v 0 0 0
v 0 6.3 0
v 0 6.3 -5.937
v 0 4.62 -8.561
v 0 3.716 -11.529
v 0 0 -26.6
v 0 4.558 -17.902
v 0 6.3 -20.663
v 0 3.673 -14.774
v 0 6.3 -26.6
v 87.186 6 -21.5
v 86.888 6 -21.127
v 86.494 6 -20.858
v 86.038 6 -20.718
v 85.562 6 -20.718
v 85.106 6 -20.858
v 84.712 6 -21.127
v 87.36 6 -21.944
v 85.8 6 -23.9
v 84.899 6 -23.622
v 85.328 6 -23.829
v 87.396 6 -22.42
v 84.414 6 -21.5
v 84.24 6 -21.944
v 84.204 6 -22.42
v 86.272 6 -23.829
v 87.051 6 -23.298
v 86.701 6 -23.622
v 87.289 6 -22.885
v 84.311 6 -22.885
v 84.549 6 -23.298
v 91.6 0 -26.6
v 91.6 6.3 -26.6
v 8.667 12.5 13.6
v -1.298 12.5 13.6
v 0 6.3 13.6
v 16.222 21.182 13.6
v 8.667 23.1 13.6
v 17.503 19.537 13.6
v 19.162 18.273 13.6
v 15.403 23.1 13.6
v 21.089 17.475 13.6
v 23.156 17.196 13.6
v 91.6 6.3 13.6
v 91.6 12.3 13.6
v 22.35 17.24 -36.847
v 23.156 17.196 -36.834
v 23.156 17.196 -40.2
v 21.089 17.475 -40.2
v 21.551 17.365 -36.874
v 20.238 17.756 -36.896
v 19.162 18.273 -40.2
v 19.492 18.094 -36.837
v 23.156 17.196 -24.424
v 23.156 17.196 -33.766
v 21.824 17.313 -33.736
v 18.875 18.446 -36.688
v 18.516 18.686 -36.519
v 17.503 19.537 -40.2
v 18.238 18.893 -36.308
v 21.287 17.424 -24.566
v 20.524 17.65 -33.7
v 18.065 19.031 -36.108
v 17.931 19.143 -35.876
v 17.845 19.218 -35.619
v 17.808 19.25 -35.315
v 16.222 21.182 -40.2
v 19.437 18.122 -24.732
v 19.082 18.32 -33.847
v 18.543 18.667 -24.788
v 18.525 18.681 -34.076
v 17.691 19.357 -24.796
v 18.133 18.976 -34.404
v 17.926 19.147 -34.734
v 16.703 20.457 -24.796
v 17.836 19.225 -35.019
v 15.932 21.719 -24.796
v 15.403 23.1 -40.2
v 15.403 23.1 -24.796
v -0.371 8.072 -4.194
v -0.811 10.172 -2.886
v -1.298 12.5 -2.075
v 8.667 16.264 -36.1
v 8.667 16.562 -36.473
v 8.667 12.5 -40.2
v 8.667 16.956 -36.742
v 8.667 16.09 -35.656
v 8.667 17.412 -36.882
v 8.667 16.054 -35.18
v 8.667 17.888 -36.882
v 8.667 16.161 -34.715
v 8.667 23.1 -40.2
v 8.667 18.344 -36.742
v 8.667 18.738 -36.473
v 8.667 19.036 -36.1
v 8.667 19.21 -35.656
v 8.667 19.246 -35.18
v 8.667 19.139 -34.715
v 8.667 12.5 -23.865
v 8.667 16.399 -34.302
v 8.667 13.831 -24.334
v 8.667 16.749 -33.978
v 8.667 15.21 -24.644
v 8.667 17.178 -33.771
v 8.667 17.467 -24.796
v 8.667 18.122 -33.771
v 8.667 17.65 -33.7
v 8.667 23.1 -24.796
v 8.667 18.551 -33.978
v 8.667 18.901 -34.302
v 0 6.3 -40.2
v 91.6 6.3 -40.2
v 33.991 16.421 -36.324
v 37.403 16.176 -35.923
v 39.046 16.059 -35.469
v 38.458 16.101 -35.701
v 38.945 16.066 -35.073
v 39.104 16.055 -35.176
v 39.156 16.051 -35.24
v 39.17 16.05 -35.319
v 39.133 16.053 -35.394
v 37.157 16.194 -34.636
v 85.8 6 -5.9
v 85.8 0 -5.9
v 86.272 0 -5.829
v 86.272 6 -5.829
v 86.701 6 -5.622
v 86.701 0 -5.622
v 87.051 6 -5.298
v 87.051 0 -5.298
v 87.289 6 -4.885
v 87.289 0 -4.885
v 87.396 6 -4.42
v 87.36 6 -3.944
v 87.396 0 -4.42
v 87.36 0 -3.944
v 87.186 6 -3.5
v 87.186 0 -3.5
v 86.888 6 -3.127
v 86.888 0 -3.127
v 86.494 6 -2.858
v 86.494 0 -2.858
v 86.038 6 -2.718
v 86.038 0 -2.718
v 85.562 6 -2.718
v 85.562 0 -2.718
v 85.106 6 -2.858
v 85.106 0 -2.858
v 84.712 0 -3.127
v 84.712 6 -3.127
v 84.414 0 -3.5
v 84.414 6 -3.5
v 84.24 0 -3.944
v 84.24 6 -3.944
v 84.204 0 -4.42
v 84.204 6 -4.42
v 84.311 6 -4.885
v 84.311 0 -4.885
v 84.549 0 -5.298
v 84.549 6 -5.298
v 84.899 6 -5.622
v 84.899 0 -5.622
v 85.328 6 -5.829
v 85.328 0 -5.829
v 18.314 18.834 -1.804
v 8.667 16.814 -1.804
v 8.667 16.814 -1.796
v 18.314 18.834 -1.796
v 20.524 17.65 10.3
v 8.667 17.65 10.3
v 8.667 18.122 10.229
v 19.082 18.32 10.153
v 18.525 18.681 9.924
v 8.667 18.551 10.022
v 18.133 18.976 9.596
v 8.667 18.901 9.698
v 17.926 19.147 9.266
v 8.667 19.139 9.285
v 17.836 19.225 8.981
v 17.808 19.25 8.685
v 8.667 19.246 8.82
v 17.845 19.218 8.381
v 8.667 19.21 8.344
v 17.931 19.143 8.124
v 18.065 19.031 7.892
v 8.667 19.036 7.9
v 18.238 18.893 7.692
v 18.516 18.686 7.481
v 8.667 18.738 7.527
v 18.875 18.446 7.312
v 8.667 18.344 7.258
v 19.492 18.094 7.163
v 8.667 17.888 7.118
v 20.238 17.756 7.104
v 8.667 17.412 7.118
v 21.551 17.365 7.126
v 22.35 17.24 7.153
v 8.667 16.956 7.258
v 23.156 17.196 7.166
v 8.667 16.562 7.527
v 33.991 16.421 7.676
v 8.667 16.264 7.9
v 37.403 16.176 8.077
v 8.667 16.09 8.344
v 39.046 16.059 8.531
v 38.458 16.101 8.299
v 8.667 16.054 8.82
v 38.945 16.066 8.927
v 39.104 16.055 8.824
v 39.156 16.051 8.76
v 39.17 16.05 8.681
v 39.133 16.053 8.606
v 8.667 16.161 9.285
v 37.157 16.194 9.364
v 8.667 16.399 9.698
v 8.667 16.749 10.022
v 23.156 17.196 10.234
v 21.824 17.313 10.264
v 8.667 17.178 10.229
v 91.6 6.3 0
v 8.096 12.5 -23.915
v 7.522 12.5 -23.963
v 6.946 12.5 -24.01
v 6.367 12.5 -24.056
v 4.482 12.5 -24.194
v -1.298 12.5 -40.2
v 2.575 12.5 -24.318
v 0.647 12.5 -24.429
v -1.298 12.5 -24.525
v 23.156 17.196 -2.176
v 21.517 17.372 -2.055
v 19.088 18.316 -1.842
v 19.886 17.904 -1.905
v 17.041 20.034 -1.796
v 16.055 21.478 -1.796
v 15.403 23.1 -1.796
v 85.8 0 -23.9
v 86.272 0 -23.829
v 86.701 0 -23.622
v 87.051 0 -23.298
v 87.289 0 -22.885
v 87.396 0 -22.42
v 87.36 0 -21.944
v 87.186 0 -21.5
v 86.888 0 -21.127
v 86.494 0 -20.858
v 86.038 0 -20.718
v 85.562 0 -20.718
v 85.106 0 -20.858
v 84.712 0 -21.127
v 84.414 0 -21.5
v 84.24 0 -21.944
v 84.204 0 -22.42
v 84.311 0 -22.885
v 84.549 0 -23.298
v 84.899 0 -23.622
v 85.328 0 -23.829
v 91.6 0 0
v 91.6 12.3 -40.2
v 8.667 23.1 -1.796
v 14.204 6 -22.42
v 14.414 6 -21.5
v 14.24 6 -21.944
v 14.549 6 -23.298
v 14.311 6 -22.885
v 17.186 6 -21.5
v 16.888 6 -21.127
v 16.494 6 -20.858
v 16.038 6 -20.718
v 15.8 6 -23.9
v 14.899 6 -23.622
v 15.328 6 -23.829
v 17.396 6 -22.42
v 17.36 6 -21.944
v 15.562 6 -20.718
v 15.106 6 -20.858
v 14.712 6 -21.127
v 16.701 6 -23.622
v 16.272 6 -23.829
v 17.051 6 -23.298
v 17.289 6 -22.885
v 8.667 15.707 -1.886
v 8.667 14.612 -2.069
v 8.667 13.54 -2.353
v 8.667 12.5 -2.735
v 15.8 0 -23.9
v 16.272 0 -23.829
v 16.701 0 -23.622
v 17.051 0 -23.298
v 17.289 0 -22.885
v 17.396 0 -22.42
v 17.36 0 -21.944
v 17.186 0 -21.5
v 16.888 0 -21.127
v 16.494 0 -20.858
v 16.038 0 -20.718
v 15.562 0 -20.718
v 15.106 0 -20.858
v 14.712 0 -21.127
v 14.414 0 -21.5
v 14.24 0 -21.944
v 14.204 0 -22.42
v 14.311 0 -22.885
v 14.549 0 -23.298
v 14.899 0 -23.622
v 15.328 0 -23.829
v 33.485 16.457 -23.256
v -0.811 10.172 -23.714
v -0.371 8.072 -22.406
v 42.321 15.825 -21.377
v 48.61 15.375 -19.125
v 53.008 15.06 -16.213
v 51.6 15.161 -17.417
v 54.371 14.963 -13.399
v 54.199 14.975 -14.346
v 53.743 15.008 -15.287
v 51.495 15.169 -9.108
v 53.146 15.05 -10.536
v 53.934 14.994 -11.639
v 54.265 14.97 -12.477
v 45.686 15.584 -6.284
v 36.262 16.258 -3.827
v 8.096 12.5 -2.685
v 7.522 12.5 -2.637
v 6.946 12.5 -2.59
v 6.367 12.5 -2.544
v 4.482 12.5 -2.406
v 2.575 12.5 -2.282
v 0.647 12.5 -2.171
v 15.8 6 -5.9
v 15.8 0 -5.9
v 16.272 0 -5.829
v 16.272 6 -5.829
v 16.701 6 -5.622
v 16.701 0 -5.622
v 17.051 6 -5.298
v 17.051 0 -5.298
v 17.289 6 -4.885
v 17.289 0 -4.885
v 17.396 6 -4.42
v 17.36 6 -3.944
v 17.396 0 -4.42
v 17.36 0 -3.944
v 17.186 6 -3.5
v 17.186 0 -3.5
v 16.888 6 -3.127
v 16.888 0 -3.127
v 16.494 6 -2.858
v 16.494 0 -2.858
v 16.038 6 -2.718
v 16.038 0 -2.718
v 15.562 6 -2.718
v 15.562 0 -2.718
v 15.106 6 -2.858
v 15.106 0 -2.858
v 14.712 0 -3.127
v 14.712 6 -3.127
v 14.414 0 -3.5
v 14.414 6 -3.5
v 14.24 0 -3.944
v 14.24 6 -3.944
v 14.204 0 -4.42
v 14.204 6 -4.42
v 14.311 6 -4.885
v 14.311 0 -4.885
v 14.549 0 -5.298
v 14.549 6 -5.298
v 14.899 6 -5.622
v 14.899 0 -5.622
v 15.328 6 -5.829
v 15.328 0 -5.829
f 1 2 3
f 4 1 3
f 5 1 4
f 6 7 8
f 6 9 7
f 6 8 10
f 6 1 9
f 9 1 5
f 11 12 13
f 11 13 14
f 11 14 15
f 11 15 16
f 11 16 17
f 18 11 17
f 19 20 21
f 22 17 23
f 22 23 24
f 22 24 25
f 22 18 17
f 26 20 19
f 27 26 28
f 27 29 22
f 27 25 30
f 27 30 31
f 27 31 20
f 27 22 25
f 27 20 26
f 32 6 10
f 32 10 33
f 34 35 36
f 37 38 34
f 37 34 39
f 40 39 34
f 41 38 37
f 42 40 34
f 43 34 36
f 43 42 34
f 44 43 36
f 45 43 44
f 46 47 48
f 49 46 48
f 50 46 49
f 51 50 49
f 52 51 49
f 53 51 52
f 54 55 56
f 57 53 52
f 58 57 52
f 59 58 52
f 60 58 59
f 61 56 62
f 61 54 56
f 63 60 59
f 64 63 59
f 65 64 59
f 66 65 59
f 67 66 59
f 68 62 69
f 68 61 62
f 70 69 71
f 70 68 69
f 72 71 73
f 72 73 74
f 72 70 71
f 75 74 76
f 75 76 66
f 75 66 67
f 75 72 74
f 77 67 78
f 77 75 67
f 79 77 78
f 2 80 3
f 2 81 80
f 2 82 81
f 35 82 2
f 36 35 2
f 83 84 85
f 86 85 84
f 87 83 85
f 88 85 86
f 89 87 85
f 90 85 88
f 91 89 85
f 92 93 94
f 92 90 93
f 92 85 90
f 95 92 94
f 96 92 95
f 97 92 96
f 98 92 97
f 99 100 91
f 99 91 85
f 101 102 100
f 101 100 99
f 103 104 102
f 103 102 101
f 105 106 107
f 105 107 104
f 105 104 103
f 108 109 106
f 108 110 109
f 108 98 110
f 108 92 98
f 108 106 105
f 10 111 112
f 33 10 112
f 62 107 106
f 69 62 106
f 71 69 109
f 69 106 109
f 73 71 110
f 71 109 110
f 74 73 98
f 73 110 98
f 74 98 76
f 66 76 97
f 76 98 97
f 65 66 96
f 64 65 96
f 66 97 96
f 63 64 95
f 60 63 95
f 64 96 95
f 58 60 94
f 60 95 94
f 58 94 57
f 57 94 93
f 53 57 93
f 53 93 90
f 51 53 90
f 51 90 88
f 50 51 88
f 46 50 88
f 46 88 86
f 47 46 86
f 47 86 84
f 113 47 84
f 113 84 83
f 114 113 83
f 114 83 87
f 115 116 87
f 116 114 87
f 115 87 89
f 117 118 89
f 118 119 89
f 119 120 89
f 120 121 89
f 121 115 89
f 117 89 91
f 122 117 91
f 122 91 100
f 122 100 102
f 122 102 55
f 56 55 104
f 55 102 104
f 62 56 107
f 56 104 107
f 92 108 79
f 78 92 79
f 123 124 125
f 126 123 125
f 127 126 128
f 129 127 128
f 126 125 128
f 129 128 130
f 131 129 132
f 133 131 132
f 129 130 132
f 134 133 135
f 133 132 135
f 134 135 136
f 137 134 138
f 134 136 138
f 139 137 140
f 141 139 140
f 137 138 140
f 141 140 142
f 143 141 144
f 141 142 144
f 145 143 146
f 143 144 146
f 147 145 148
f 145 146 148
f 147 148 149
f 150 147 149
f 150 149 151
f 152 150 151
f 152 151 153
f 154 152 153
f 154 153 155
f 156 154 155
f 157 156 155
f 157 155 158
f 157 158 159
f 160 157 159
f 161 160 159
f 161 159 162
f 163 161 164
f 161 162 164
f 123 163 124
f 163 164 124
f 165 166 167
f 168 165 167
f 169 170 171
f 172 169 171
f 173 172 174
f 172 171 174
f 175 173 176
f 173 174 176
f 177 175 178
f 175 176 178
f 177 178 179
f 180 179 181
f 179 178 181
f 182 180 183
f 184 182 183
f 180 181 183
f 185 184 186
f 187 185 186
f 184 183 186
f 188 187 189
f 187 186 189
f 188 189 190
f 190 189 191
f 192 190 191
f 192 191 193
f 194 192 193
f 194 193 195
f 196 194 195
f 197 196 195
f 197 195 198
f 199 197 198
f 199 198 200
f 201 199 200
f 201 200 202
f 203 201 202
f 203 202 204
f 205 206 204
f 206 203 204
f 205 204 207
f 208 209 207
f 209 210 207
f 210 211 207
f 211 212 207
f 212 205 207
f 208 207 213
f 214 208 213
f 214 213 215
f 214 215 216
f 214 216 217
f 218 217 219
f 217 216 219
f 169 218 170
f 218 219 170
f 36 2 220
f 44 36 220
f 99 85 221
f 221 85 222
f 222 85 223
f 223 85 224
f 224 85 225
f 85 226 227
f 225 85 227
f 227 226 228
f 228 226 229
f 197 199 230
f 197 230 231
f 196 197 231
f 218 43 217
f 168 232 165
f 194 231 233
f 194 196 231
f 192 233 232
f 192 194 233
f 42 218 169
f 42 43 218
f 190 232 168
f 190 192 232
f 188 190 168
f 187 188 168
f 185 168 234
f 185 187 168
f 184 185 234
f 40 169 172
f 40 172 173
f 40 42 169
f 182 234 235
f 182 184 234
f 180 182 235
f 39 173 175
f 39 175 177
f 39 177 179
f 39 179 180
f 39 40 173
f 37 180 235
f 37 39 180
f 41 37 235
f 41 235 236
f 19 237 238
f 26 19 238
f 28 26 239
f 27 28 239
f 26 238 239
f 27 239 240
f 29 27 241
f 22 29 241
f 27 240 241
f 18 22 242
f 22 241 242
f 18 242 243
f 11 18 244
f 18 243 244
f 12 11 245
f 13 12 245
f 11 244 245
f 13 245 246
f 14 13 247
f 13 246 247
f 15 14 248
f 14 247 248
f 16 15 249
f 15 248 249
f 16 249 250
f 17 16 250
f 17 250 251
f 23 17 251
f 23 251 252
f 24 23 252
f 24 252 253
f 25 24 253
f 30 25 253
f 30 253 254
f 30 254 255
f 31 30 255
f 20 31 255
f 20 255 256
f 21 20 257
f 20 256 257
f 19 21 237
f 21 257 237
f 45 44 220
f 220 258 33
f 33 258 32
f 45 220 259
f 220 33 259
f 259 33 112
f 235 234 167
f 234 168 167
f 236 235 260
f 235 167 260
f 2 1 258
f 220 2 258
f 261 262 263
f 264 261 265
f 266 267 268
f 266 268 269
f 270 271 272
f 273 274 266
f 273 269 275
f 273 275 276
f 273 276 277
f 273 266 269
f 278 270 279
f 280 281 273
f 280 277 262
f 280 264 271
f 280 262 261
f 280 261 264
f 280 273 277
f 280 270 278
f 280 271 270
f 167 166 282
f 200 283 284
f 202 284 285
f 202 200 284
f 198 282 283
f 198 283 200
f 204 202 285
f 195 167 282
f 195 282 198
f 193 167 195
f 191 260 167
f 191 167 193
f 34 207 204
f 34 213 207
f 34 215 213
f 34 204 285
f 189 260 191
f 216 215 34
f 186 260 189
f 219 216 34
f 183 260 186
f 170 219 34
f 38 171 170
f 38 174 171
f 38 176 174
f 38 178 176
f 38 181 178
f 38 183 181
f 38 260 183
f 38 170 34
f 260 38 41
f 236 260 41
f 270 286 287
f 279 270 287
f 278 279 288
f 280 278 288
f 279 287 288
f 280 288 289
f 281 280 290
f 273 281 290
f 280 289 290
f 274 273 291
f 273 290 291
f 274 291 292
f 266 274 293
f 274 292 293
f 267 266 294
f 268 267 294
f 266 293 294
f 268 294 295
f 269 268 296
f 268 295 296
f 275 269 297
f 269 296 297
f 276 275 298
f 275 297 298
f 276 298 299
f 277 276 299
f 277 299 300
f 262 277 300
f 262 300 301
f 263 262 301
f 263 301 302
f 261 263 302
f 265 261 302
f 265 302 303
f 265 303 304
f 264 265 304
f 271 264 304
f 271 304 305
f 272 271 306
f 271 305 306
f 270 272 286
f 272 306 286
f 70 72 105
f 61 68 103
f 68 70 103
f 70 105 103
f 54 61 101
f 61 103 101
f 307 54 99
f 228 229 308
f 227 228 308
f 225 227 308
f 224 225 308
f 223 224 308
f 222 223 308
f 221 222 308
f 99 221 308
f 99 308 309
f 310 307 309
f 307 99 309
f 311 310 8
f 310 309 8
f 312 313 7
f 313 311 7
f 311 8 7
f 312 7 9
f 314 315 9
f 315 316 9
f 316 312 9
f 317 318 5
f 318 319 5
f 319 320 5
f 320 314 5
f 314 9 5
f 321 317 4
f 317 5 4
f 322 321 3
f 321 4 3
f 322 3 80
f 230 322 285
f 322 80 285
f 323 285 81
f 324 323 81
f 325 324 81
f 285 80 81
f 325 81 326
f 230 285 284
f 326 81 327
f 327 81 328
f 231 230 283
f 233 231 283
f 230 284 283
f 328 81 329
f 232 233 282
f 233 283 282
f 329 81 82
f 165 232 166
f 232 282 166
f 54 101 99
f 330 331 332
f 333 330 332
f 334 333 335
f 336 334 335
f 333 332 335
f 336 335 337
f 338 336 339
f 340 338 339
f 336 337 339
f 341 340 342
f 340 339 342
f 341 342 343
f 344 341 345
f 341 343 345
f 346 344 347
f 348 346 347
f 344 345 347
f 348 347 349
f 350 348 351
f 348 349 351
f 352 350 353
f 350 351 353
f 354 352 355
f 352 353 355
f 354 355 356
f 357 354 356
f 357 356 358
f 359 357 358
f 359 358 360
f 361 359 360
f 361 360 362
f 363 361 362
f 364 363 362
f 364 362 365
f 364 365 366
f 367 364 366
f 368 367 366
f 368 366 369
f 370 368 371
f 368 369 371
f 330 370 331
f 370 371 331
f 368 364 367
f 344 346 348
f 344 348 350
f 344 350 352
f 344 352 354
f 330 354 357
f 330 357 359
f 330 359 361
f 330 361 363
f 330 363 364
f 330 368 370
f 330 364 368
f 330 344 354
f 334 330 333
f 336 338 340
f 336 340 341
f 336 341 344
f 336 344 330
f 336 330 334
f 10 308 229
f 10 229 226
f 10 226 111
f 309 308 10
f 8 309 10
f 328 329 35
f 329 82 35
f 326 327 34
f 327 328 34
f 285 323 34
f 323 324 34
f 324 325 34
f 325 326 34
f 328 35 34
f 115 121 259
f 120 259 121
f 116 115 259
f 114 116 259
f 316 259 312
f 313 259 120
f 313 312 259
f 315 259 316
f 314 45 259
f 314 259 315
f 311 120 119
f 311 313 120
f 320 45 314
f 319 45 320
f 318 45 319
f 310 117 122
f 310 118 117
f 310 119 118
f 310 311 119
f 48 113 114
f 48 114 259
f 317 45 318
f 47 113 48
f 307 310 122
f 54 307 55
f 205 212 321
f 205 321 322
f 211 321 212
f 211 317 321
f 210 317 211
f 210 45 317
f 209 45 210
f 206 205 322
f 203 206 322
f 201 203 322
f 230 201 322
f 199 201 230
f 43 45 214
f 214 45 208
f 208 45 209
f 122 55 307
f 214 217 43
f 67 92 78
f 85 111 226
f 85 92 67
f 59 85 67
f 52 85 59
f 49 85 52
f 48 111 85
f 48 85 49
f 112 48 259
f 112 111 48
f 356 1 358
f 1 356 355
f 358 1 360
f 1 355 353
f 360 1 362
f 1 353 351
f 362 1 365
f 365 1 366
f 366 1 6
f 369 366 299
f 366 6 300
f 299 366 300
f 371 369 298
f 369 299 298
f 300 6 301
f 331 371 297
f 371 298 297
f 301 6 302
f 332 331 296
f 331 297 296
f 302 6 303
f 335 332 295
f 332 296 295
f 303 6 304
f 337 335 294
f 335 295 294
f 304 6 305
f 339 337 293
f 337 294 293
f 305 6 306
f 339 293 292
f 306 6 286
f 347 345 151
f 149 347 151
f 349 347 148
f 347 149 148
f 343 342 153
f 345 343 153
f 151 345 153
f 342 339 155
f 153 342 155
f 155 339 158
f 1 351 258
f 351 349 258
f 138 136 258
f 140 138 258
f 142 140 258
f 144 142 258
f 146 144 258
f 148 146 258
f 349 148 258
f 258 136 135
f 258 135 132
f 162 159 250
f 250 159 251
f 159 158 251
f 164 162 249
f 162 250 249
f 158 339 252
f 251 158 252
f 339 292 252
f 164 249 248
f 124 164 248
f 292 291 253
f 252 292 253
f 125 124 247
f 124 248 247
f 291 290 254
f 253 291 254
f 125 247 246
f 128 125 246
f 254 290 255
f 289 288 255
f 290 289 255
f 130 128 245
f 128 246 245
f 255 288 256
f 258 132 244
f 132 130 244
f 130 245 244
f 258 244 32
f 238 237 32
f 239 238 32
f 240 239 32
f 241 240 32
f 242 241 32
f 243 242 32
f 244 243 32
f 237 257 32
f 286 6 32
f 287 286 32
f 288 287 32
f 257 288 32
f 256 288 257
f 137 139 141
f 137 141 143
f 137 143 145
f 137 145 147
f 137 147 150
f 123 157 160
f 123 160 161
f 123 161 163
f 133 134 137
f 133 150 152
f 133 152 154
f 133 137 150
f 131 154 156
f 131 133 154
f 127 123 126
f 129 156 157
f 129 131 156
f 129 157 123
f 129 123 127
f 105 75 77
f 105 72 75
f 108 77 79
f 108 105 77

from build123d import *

# Parameters (mm, degrees)
SKETCH1_W           = 91.6
SKETCH1_H           = 26.6
BOSS_EXTRUDE1_DEPTH = 6.3
SKETCH2_W           = 91.6
SKETCH2_H           = 53.8
BOSS_EXTRUDE2_DEPTH = 6
BOSS_EXTRUDE3_REACH = 108.941
SKETCH5_R           = 11.5
CUT_EXTRUDE1_DEPTH  = 56.5
SKETCH6_W           = 23
SKETCH6_H           = 11
CUT_EXTRUDE2_DEPTH  = 40
SKETCH8_R           = 1.6
CUT_EXTRUDE3_DEPTH  = 6
CUT_EXTRUDE4_REACH  = 111.225
SKETCH10_W          = 53.8
SKETCH10_H          = 10.6
CUT_EXTRUDE5_DEPTH  = 2.3
CUT_EXTRUDE6_REACH  = 97.014
SKETCH11_R          = 1.6


with BuildPart() as part:
    # Sketch1 → Boss-Extrude1 (new body)
    with BuildSketch(Plane(origin=(0, 0, 0), x_dir=(1, 0, 0), z_dir=(0, 1, 0))):
        with Locations((45.8, 13.3)):
            Rectangle(SKETCH1_W, SKETCH1_H)
    extrude(amount=BOSS_EXTRUDE1_DEPTH)

    # Sketch2 → Boss-Extrude2 (add)
    with BuildSketch(Plane(origin=(0, 6.3, 0), x_dir=(1, 0, 0), z_dir=(0, 1, 0))):
        with Locations((45.8, 13.3)):
            Rectangle(SKETCH2_W, SKETCH2_H)
    extrude(amount=BOSS_EXTRUDE2_DEPTH)

    # Boss-Extrude3: up to this face of the body (flat: up to its plane)
    boss_extrude3_end = Plane(part.part.faces().sort_by_distance((45.8, 9.3, -40.2))[0])
    # Sketch3 → Boss-Extrude3 (add, up to the picked face)
    with BuildSketch(Plane.XY.offset(13.6), mode=Mode.PRIVATE) as boss_extrude3_sk1:
        with BuildLine():
            Line((91.6, 12.3), (23.155649055, 17.195554695))
            ThreePointArc((23.155649055, 17.195554695), (17.419589145, 19.620522611), (15.1, 25.4))
            Line((15.1, 25.4), (-4, 25.4))
            Line((-4, 25.4), (0, 6.3))
            Line((0, 6.3), (0, 12.3))
            Line((0, 12.3), (91.6, 12.3))
        make_face()
    boss_extrude3_tool1 = split(extrude(boss_extrude3_sk1.sketch, amount=-BOSS_EXTRUDE3_REACH, mode=Mode.PRIVATE), bisect_by=boss_extrude3_end, keep=Keep.BOTH, mode=Mode.PRIVATE)
    add(boss_extrude3_tool1.solids().sort_by(Axis((22.17792, 16.713333, 13.6), (0, 0, -1)))[0])

    # Sketch5 → Cut-Extrude1 (cut, symmetric)
    with BuildSketch(Plane(origin=(1.263937397, 0.264698931, 0), x_dir=(0, 0, 1), z_dir=(-0.9787667222739368, -0.2049773240364267, 0))):
        with Locations((-13.3, 15)):
            Circle(SKETCH5_R)
    extrude(amount=CUT_EXTRUDE1_DEPTH, both=True, mode=Mode.SUBTRACT)

    # Sketch6 → Cut-Extrude2 (cut, symmetric)
    with BuildSketch(Plane(origin=(1.263937397, 0.264698931, 0), x_dir=(0, 0, 1), z_dir=(-0.9787667222739368, -0.2049773240364267, 0))):
        with Locations((-13.295563207, 20.180584042)):
            Rectangle(SKETCH6_W, SKETCH6_H)
    extrude(amount=CUT_EXTRUDE2_DEPTH, both=True, mode=Mode.SUBTRACT)

    # Sketch8 → Cut-Extrude3 (cut)
    with BuildSketch(Plane.XZ):
        with Locations(Location((15.8, -4.3, 0), (0, 0, 270))):
            Circle(SKETCH8_R)
        with Locations(Location((85.8, -4.3, 0), (0, 0, 270))):
            Circle(SKETCH8_R)
        with Locations(Location((85.8, -22.3, 0), (0, 0, 270))):
            Circle(SKETCH8_R)
        with Locations(Location((15.8, -22.3, 0), (0, 0, 270))):
            Circle(SKETCH8_R)
    extrude(amount=-CUT_EXTRUDE3_DEPTH, mode=Mode.SUBTRACT)

    # Cut-Extrude4: up to this face of the body (flat: up to its plane)
    cut_extrude4_end = Plane(part.part.faces().sort_by_distance((35.074761292, 12.665908848, -40.2))[0])
    # Sketch9 → Cut-Extrude4 (cut, up to the picked face)
    with BuildSketch(Plane.XY.offset(13.6), mode=Mode.PRIVATE) as cut_extrude4_sk1:
        with BuildLine():
            Line((-1.298429319, 12.5), (6.366705086, 12.5))
            Line((6.366705086, 12.5), (6.366705086, 23.1))
            Line((6.366705086, 23.1), (15.402527223, 23.1))
            ThreePointArc((15.402527223, 23.1), (15.168498155, 24.239113564), (15.1, 25.4))
            Line((15.1, 25.4), (-4, 25.4))
            Line((-4, 25.4), (-1.298429319, 12.5))
        make_face()
    cut_extrude4_tool1 = split(extrude(cut_extrude4_sk1.sketch, amount=-CUT_EXTRUDE4_REACH, mode=Mode.PRIVATE), bisect_by=cut_extrude4_end, keep=Keep.BOTH, mode=Mode.PRIVATE)
    add(cut_extrude4_tool1.solids().sort_by(Axis((3.156249, 20.011038, 13.6), (0, 0, -1)))[0], mode=Mode.SUBTRACT)

    # Sketch10 → Cut-Extrude5 (cut)
    with BuildSketch(Plane.ZY.offset(-6.366705086)):
        with Locations((-13.3, 17.8)):
            Rectangle(SKETCH10_W, SKETCH10_H)
    extrude(amount=-CUT_EXTRUDE5_DEPTH, mode=Mode.SUBTRACT)

    # Sketch11 → Cut-Extrude6 (cut, up to next)
    with BuildSketch(Plane.ZY.offset(-8.666705086), mode=Mode.PRIVATE) as cut_extrude6_sk1:
        with Locations((-35.3, 17.65)):
            Circle(SKETCH11_R)
    cut_extrude6_tool1 = extrude(cut_extrude6_sk1.sketch, amount=-CUT_EXTRUDE6_REACH, mode=Mode.PRIVATE) & part.part
    # Sketch11 → Cut-Extrude6 (cut, up to next)
    with BuildSketch(Plane.ZY.offset(-8.666705086), mode=Mode.PRIVATE) as cut_extrude6_sk2:
        with Locations((8.7, 17.65)):
            Circle(SKETCH11_R)
    cut_extrude6_tool2 = extrude(cut_extrude6_sk2.sketch, amount=-CUT_EXTRUDE6_REACH, mode=Mode.PRIVATE) & part.part
    add(cut_extrude6_tool1.solids().sort_by_distance((8.666705, 17.65, -35.3))[0], mode=Mode.SUBTRACT)
    add(cut_extrude6_tool2.solids().sort_by_distance((8.666705, 17.65, 8.7))[0], mode=Mode.SUBTRACT)


solid = part.part
